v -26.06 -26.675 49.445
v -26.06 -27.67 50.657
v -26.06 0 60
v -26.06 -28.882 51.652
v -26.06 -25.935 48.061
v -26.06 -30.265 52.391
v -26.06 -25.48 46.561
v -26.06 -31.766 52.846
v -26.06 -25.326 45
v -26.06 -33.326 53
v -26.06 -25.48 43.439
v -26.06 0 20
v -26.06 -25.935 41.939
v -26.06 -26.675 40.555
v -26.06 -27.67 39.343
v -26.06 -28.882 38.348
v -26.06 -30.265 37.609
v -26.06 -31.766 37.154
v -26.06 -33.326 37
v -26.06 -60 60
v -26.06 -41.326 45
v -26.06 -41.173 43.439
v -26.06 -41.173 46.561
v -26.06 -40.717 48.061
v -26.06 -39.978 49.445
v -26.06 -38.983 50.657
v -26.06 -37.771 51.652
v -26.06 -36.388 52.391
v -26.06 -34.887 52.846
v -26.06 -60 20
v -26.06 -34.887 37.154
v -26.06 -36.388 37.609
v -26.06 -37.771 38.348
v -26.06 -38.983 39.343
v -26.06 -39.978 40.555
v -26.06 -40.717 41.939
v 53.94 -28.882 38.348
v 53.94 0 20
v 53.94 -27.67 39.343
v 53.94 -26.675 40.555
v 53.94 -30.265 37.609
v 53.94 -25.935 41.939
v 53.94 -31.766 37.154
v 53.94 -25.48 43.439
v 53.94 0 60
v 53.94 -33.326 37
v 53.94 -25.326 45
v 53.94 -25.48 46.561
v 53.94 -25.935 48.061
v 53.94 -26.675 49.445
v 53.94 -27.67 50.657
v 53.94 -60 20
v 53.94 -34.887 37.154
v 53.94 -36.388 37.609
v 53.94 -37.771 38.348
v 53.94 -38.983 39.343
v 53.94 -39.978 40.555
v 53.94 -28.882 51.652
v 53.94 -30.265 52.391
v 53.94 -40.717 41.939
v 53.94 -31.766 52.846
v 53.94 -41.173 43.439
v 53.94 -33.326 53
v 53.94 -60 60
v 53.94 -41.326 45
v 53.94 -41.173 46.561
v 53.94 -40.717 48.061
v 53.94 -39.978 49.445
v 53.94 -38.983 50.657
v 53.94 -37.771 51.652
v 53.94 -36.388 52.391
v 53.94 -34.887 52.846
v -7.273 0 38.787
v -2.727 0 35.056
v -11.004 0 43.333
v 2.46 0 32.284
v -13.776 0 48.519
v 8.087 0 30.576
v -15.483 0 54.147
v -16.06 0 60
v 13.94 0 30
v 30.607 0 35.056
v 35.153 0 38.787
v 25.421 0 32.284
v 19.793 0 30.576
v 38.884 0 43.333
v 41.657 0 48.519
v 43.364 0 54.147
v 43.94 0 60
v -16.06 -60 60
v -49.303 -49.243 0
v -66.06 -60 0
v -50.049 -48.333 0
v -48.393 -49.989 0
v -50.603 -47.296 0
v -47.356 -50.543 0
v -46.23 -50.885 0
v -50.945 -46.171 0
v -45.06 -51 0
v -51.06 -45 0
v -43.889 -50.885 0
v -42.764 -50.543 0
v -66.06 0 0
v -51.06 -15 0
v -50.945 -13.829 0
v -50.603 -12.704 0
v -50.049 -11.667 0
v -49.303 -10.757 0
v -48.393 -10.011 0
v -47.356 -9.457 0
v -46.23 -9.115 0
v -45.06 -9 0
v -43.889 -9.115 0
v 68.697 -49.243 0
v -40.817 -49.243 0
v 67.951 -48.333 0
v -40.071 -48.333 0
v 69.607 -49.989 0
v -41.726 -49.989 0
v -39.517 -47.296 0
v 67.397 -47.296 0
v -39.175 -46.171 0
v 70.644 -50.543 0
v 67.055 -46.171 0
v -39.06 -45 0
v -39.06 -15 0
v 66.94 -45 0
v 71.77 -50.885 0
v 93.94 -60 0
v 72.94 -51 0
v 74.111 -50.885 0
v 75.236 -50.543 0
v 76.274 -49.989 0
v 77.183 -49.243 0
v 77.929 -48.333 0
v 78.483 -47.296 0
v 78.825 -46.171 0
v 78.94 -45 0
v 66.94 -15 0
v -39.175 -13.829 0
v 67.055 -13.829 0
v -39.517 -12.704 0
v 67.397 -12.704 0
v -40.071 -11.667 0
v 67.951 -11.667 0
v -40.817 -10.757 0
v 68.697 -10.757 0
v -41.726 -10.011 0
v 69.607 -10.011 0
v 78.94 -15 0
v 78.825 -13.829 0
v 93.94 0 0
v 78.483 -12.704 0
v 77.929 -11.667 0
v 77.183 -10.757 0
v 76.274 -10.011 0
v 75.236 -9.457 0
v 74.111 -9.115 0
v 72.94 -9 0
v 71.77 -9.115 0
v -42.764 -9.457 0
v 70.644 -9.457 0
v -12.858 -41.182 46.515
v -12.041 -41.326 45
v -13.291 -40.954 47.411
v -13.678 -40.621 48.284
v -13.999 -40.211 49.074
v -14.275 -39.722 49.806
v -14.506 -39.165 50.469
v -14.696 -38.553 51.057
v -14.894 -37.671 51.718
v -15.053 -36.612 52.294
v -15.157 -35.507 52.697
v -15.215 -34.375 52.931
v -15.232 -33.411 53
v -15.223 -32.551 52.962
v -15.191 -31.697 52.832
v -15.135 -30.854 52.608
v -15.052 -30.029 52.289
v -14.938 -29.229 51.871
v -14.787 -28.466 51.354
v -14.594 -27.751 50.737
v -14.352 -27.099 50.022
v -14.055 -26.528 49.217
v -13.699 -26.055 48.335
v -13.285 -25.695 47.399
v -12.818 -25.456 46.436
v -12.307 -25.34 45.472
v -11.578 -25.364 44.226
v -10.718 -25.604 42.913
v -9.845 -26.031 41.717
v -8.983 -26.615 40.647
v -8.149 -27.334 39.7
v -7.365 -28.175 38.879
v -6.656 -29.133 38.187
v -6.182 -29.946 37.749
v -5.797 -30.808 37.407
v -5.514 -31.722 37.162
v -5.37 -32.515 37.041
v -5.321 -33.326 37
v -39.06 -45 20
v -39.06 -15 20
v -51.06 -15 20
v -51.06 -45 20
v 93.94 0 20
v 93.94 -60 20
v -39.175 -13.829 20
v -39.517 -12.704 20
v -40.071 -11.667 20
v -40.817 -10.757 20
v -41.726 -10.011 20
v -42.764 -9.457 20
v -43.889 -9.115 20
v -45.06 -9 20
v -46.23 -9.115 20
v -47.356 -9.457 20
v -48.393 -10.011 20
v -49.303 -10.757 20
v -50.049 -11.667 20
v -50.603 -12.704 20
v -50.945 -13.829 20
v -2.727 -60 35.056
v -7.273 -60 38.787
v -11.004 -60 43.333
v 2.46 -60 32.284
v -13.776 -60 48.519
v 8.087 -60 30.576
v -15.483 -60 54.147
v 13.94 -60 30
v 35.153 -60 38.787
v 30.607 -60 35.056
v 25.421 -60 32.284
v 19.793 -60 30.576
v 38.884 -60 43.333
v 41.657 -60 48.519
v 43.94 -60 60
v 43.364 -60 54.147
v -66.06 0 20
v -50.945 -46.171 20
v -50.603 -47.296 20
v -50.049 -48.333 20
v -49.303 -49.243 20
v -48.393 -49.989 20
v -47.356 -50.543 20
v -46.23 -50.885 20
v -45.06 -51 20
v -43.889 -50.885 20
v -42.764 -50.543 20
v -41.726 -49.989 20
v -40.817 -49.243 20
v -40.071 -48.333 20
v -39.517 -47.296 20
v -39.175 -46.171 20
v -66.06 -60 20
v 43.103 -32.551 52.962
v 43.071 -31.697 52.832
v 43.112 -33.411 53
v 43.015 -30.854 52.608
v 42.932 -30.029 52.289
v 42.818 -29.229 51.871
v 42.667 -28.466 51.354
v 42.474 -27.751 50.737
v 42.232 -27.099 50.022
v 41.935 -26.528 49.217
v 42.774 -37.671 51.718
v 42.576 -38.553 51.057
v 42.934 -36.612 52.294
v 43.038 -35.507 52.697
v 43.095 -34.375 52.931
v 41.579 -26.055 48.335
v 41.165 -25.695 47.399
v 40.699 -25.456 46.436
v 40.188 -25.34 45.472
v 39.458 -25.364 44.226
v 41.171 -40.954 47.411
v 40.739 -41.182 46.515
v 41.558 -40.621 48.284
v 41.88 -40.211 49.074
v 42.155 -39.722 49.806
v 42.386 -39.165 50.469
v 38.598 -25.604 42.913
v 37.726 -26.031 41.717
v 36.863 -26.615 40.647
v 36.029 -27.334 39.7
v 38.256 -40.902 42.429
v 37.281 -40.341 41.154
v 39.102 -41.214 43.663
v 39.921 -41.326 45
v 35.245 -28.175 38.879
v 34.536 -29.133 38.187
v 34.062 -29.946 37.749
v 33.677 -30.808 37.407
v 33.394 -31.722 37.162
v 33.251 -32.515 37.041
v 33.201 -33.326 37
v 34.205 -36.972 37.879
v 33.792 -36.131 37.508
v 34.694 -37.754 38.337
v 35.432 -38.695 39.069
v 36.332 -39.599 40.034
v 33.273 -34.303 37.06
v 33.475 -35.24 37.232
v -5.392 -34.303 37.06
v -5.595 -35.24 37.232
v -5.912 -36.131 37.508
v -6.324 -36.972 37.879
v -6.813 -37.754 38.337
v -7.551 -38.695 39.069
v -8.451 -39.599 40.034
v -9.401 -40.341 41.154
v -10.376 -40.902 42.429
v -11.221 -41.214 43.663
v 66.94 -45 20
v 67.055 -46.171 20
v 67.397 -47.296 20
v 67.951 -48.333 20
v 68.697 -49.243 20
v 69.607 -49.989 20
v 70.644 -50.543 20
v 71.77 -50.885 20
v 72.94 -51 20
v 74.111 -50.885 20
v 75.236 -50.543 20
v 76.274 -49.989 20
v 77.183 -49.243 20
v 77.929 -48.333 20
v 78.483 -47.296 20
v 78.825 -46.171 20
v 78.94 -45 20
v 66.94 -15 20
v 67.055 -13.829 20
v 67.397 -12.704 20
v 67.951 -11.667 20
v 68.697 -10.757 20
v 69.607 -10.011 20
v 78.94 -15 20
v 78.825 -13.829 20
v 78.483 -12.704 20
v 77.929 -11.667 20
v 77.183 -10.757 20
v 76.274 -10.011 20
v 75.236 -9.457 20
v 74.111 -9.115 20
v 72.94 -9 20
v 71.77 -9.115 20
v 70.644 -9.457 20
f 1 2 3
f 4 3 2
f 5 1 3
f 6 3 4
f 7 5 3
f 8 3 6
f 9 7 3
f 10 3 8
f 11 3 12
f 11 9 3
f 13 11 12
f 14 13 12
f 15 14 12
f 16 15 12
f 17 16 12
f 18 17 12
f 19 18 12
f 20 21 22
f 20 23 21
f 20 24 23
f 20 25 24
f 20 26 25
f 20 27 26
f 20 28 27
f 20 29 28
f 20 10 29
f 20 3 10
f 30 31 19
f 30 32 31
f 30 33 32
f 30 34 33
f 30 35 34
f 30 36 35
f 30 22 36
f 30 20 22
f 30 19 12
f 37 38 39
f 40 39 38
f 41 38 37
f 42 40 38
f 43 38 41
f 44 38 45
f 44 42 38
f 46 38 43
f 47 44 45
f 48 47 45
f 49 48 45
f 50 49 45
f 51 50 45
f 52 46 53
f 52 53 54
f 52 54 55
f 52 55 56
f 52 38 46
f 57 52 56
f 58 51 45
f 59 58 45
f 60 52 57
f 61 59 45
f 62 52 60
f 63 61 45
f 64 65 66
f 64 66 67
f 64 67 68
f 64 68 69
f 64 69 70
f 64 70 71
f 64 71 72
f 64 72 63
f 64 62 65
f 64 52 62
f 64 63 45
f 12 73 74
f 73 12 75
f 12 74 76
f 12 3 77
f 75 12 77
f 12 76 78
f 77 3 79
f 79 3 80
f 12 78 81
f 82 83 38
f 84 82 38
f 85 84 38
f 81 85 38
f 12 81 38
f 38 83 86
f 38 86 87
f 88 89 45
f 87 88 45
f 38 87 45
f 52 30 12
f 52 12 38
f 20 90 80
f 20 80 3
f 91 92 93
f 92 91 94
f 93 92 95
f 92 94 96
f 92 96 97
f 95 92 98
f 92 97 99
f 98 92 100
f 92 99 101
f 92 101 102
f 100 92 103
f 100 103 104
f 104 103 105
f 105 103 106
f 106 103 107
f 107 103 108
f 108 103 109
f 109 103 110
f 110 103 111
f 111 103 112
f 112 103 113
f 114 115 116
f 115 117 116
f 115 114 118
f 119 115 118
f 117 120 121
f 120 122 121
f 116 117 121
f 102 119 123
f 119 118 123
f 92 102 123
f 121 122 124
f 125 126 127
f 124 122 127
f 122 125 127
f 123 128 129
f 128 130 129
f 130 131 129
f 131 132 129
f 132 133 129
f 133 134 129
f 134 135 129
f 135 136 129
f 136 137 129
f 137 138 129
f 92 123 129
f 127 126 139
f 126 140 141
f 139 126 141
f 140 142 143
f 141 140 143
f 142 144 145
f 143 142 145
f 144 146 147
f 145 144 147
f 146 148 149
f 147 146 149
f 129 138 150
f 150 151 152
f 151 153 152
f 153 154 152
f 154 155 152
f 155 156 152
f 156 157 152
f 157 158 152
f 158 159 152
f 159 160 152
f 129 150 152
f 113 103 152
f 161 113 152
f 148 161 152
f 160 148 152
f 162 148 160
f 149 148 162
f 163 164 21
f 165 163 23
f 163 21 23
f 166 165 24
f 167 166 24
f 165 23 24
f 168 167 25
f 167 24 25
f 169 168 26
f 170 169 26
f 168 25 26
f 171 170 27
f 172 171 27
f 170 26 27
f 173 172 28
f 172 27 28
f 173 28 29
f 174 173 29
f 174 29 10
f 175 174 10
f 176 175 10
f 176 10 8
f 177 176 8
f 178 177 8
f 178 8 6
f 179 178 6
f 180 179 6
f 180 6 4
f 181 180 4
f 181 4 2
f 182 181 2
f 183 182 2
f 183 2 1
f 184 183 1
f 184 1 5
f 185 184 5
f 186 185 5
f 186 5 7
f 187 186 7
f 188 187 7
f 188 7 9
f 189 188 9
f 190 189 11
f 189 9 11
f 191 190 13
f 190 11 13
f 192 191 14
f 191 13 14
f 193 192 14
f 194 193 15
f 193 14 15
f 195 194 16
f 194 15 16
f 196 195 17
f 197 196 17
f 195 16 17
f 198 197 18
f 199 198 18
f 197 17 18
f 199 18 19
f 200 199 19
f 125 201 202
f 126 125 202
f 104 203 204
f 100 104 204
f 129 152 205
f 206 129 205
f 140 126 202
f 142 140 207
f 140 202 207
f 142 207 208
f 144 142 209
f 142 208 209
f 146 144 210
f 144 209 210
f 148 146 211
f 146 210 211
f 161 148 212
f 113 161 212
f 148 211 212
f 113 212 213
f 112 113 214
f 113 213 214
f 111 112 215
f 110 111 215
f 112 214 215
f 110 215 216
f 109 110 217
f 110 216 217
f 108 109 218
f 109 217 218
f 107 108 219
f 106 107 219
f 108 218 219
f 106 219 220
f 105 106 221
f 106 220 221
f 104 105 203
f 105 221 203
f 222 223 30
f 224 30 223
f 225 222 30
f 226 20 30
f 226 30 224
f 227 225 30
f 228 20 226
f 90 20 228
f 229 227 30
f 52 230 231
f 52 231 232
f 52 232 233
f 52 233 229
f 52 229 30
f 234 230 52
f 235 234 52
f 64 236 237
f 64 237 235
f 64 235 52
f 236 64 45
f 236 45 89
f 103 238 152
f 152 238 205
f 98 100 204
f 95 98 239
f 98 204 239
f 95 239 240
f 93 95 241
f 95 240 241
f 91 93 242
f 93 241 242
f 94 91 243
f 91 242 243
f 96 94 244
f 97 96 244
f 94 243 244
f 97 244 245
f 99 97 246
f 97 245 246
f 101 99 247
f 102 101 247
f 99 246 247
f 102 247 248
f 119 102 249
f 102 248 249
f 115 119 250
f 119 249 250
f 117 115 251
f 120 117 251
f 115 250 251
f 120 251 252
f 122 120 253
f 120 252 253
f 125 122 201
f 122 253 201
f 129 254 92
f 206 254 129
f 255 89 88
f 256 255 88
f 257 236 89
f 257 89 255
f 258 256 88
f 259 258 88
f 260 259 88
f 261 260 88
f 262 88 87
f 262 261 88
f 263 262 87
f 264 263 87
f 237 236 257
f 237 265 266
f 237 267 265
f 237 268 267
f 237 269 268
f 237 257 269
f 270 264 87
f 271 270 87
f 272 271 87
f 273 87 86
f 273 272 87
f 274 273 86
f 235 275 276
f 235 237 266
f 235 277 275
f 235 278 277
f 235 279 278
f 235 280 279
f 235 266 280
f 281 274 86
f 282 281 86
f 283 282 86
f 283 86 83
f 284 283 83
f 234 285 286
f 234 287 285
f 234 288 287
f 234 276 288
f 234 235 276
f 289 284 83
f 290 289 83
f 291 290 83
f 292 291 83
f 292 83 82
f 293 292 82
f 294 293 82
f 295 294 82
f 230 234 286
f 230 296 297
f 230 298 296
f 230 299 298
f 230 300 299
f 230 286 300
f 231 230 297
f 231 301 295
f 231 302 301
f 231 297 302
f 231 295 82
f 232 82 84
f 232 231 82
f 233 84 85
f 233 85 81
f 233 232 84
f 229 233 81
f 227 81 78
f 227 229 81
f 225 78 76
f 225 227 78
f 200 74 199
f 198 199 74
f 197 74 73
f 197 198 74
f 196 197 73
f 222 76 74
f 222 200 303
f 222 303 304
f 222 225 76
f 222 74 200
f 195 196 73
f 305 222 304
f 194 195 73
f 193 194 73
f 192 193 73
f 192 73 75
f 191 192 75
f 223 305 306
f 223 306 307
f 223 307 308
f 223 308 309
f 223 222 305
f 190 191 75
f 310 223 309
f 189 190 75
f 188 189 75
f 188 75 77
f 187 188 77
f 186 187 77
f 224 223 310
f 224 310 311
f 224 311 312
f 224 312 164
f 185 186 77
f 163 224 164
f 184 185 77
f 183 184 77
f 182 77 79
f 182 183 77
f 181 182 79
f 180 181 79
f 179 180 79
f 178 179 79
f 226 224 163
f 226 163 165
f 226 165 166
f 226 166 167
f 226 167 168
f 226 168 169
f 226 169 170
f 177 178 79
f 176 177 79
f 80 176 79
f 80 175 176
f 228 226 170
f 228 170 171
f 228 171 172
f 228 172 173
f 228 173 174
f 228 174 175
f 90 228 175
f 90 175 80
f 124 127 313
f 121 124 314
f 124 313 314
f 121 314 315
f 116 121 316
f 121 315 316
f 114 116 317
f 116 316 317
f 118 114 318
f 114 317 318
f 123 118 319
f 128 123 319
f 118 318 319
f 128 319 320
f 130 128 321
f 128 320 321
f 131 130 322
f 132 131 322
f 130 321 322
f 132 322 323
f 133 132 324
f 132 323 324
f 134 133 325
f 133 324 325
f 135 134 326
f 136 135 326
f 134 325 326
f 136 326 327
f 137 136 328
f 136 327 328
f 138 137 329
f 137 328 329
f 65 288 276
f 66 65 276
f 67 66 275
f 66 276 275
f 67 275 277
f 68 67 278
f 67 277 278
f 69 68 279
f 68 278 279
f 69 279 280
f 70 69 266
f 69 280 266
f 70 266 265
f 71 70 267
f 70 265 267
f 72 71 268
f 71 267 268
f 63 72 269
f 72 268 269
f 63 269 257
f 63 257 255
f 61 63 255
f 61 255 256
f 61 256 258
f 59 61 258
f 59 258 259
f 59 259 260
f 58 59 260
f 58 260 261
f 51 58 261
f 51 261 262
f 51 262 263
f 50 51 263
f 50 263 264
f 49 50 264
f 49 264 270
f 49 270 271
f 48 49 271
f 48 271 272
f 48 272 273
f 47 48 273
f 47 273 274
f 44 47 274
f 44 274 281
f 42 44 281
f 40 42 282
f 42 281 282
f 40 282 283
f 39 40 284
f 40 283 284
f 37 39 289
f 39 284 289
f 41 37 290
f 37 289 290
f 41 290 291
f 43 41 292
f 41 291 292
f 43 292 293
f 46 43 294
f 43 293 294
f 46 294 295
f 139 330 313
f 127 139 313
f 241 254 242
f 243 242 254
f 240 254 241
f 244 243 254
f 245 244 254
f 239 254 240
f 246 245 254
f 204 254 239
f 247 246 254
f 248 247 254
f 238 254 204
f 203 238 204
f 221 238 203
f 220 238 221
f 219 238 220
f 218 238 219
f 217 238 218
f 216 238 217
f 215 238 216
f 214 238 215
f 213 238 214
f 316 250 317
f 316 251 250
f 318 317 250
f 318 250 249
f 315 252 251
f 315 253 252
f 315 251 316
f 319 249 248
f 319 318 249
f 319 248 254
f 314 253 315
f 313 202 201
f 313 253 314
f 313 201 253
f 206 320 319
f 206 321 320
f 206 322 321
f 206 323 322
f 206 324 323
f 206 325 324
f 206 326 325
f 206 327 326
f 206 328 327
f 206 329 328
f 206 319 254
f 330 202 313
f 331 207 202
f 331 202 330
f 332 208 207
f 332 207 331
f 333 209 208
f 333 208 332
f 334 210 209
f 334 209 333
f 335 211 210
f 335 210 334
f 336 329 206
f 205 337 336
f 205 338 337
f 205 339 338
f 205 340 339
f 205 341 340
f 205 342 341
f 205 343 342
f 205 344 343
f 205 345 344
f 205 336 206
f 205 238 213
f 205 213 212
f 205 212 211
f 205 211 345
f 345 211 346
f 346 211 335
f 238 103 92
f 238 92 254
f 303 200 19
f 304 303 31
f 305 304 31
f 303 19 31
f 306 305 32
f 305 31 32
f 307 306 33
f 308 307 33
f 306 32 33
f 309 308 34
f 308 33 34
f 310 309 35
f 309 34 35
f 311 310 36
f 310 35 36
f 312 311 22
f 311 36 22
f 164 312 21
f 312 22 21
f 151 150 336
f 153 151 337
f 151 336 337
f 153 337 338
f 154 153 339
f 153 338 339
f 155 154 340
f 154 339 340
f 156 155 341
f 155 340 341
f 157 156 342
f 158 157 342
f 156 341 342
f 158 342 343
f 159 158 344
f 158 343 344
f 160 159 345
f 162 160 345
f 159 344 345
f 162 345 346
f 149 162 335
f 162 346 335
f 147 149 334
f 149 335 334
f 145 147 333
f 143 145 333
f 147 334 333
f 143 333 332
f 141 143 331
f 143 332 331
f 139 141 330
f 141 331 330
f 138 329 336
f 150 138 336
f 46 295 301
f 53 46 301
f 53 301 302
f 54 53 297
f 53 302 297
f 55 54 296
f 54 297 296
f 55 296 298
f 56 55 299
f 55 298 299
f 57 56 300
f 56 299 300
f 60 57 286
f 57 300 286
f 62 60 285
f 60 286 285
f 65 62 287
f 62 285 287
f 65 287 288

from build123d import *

# Parameters (mm, degrees)
F0_W     = 160
F0_H     = 20
F1_DEPTH = 60
F3_DEPTH = 60
F5_DEPTH = 80
F7_DEPTH = 20


with BuildPart() as f1:
    # F0 (on Front) → F1 (new body)
    with BuildSketch(Plane.XZ):
        with Locations((13.940135, 10)):
            Rectangle(F0_W, F0_H)
    extrude(amount=F1_DEPTH)

    # F6 (on face) → F7 (cut)
    with BuildSketch(Plane.XY.offset(20)):
        with BuildLine():
            Line((78.940135, -45), (78.940135, -30))
            Line((78.940135, -30), (78.940135, -15))
            ThreePointArc((78.940135, -15), (72.940135, -9), (66.940135, -15))
            Line((66.940135, -15), (66.940135, -45))
            ThreePointArc((66.940135, -45), (72.940135, -51), (78.940135, -45))
        make_face()
        with BuildLine():
            Line((-51.059865, -15), (-51.059865, -30))
            Line((-51.059865, -30), (-51.059865, -45))
            ThreePointArc((-51.059865, -45), (-45.059865, -51), (-39.059865, -45))
            Line((-39.059865, -45), (-39.059865, -15))
            ThreePointArc((-39.059865, -15), (-45.059865, -9), (-51.059865, -15))
        make_face()
    extrude(amount=-F7_DEPTH, mode=Mode.SUBTRACT)


with BuildPart() as f3:
    # F2 (on face) → F3 (new body)
    with BuildSketch(Plane.XZ.offset(60)):
        with BuildLine():
            Line((-26.059865, 60), (-26.059865, 20))
            Line((-26.059865, 20), (53.940135, 20))
            Line((53.940135, 20), (53.940135, 60))
            Line((53.940135, 60), (43.940135, 60))
            ThreePointArc((43.940135, 60), (13.940135, 30), (-16.059865, 60))
            Line((-16.059865, 60), (-26.059865, 60))
        make_face()
    extrude(amount=-F3_DEPTH)

    # F4 (on face) → F5 (cut)
    with BuildSketch(Plane(origin=(-26.059865, 0, 0), x_dir=(0, -1, 0), z_dir=(-1, 0, 0))):
        with BuildLine():
            ThreePointArc((33.326432, 37), (38.983286, 39.343146), (41.326432, 45))
            ThreePointArc((41.326432, 45), (27.669578, 50.656854), (33.326432, 37))
        make_face()
    extrude(amount=-F5_DEPTH, mode=Mode.SUBTRACT)


solid = Compound([f1.part, f3.part])
